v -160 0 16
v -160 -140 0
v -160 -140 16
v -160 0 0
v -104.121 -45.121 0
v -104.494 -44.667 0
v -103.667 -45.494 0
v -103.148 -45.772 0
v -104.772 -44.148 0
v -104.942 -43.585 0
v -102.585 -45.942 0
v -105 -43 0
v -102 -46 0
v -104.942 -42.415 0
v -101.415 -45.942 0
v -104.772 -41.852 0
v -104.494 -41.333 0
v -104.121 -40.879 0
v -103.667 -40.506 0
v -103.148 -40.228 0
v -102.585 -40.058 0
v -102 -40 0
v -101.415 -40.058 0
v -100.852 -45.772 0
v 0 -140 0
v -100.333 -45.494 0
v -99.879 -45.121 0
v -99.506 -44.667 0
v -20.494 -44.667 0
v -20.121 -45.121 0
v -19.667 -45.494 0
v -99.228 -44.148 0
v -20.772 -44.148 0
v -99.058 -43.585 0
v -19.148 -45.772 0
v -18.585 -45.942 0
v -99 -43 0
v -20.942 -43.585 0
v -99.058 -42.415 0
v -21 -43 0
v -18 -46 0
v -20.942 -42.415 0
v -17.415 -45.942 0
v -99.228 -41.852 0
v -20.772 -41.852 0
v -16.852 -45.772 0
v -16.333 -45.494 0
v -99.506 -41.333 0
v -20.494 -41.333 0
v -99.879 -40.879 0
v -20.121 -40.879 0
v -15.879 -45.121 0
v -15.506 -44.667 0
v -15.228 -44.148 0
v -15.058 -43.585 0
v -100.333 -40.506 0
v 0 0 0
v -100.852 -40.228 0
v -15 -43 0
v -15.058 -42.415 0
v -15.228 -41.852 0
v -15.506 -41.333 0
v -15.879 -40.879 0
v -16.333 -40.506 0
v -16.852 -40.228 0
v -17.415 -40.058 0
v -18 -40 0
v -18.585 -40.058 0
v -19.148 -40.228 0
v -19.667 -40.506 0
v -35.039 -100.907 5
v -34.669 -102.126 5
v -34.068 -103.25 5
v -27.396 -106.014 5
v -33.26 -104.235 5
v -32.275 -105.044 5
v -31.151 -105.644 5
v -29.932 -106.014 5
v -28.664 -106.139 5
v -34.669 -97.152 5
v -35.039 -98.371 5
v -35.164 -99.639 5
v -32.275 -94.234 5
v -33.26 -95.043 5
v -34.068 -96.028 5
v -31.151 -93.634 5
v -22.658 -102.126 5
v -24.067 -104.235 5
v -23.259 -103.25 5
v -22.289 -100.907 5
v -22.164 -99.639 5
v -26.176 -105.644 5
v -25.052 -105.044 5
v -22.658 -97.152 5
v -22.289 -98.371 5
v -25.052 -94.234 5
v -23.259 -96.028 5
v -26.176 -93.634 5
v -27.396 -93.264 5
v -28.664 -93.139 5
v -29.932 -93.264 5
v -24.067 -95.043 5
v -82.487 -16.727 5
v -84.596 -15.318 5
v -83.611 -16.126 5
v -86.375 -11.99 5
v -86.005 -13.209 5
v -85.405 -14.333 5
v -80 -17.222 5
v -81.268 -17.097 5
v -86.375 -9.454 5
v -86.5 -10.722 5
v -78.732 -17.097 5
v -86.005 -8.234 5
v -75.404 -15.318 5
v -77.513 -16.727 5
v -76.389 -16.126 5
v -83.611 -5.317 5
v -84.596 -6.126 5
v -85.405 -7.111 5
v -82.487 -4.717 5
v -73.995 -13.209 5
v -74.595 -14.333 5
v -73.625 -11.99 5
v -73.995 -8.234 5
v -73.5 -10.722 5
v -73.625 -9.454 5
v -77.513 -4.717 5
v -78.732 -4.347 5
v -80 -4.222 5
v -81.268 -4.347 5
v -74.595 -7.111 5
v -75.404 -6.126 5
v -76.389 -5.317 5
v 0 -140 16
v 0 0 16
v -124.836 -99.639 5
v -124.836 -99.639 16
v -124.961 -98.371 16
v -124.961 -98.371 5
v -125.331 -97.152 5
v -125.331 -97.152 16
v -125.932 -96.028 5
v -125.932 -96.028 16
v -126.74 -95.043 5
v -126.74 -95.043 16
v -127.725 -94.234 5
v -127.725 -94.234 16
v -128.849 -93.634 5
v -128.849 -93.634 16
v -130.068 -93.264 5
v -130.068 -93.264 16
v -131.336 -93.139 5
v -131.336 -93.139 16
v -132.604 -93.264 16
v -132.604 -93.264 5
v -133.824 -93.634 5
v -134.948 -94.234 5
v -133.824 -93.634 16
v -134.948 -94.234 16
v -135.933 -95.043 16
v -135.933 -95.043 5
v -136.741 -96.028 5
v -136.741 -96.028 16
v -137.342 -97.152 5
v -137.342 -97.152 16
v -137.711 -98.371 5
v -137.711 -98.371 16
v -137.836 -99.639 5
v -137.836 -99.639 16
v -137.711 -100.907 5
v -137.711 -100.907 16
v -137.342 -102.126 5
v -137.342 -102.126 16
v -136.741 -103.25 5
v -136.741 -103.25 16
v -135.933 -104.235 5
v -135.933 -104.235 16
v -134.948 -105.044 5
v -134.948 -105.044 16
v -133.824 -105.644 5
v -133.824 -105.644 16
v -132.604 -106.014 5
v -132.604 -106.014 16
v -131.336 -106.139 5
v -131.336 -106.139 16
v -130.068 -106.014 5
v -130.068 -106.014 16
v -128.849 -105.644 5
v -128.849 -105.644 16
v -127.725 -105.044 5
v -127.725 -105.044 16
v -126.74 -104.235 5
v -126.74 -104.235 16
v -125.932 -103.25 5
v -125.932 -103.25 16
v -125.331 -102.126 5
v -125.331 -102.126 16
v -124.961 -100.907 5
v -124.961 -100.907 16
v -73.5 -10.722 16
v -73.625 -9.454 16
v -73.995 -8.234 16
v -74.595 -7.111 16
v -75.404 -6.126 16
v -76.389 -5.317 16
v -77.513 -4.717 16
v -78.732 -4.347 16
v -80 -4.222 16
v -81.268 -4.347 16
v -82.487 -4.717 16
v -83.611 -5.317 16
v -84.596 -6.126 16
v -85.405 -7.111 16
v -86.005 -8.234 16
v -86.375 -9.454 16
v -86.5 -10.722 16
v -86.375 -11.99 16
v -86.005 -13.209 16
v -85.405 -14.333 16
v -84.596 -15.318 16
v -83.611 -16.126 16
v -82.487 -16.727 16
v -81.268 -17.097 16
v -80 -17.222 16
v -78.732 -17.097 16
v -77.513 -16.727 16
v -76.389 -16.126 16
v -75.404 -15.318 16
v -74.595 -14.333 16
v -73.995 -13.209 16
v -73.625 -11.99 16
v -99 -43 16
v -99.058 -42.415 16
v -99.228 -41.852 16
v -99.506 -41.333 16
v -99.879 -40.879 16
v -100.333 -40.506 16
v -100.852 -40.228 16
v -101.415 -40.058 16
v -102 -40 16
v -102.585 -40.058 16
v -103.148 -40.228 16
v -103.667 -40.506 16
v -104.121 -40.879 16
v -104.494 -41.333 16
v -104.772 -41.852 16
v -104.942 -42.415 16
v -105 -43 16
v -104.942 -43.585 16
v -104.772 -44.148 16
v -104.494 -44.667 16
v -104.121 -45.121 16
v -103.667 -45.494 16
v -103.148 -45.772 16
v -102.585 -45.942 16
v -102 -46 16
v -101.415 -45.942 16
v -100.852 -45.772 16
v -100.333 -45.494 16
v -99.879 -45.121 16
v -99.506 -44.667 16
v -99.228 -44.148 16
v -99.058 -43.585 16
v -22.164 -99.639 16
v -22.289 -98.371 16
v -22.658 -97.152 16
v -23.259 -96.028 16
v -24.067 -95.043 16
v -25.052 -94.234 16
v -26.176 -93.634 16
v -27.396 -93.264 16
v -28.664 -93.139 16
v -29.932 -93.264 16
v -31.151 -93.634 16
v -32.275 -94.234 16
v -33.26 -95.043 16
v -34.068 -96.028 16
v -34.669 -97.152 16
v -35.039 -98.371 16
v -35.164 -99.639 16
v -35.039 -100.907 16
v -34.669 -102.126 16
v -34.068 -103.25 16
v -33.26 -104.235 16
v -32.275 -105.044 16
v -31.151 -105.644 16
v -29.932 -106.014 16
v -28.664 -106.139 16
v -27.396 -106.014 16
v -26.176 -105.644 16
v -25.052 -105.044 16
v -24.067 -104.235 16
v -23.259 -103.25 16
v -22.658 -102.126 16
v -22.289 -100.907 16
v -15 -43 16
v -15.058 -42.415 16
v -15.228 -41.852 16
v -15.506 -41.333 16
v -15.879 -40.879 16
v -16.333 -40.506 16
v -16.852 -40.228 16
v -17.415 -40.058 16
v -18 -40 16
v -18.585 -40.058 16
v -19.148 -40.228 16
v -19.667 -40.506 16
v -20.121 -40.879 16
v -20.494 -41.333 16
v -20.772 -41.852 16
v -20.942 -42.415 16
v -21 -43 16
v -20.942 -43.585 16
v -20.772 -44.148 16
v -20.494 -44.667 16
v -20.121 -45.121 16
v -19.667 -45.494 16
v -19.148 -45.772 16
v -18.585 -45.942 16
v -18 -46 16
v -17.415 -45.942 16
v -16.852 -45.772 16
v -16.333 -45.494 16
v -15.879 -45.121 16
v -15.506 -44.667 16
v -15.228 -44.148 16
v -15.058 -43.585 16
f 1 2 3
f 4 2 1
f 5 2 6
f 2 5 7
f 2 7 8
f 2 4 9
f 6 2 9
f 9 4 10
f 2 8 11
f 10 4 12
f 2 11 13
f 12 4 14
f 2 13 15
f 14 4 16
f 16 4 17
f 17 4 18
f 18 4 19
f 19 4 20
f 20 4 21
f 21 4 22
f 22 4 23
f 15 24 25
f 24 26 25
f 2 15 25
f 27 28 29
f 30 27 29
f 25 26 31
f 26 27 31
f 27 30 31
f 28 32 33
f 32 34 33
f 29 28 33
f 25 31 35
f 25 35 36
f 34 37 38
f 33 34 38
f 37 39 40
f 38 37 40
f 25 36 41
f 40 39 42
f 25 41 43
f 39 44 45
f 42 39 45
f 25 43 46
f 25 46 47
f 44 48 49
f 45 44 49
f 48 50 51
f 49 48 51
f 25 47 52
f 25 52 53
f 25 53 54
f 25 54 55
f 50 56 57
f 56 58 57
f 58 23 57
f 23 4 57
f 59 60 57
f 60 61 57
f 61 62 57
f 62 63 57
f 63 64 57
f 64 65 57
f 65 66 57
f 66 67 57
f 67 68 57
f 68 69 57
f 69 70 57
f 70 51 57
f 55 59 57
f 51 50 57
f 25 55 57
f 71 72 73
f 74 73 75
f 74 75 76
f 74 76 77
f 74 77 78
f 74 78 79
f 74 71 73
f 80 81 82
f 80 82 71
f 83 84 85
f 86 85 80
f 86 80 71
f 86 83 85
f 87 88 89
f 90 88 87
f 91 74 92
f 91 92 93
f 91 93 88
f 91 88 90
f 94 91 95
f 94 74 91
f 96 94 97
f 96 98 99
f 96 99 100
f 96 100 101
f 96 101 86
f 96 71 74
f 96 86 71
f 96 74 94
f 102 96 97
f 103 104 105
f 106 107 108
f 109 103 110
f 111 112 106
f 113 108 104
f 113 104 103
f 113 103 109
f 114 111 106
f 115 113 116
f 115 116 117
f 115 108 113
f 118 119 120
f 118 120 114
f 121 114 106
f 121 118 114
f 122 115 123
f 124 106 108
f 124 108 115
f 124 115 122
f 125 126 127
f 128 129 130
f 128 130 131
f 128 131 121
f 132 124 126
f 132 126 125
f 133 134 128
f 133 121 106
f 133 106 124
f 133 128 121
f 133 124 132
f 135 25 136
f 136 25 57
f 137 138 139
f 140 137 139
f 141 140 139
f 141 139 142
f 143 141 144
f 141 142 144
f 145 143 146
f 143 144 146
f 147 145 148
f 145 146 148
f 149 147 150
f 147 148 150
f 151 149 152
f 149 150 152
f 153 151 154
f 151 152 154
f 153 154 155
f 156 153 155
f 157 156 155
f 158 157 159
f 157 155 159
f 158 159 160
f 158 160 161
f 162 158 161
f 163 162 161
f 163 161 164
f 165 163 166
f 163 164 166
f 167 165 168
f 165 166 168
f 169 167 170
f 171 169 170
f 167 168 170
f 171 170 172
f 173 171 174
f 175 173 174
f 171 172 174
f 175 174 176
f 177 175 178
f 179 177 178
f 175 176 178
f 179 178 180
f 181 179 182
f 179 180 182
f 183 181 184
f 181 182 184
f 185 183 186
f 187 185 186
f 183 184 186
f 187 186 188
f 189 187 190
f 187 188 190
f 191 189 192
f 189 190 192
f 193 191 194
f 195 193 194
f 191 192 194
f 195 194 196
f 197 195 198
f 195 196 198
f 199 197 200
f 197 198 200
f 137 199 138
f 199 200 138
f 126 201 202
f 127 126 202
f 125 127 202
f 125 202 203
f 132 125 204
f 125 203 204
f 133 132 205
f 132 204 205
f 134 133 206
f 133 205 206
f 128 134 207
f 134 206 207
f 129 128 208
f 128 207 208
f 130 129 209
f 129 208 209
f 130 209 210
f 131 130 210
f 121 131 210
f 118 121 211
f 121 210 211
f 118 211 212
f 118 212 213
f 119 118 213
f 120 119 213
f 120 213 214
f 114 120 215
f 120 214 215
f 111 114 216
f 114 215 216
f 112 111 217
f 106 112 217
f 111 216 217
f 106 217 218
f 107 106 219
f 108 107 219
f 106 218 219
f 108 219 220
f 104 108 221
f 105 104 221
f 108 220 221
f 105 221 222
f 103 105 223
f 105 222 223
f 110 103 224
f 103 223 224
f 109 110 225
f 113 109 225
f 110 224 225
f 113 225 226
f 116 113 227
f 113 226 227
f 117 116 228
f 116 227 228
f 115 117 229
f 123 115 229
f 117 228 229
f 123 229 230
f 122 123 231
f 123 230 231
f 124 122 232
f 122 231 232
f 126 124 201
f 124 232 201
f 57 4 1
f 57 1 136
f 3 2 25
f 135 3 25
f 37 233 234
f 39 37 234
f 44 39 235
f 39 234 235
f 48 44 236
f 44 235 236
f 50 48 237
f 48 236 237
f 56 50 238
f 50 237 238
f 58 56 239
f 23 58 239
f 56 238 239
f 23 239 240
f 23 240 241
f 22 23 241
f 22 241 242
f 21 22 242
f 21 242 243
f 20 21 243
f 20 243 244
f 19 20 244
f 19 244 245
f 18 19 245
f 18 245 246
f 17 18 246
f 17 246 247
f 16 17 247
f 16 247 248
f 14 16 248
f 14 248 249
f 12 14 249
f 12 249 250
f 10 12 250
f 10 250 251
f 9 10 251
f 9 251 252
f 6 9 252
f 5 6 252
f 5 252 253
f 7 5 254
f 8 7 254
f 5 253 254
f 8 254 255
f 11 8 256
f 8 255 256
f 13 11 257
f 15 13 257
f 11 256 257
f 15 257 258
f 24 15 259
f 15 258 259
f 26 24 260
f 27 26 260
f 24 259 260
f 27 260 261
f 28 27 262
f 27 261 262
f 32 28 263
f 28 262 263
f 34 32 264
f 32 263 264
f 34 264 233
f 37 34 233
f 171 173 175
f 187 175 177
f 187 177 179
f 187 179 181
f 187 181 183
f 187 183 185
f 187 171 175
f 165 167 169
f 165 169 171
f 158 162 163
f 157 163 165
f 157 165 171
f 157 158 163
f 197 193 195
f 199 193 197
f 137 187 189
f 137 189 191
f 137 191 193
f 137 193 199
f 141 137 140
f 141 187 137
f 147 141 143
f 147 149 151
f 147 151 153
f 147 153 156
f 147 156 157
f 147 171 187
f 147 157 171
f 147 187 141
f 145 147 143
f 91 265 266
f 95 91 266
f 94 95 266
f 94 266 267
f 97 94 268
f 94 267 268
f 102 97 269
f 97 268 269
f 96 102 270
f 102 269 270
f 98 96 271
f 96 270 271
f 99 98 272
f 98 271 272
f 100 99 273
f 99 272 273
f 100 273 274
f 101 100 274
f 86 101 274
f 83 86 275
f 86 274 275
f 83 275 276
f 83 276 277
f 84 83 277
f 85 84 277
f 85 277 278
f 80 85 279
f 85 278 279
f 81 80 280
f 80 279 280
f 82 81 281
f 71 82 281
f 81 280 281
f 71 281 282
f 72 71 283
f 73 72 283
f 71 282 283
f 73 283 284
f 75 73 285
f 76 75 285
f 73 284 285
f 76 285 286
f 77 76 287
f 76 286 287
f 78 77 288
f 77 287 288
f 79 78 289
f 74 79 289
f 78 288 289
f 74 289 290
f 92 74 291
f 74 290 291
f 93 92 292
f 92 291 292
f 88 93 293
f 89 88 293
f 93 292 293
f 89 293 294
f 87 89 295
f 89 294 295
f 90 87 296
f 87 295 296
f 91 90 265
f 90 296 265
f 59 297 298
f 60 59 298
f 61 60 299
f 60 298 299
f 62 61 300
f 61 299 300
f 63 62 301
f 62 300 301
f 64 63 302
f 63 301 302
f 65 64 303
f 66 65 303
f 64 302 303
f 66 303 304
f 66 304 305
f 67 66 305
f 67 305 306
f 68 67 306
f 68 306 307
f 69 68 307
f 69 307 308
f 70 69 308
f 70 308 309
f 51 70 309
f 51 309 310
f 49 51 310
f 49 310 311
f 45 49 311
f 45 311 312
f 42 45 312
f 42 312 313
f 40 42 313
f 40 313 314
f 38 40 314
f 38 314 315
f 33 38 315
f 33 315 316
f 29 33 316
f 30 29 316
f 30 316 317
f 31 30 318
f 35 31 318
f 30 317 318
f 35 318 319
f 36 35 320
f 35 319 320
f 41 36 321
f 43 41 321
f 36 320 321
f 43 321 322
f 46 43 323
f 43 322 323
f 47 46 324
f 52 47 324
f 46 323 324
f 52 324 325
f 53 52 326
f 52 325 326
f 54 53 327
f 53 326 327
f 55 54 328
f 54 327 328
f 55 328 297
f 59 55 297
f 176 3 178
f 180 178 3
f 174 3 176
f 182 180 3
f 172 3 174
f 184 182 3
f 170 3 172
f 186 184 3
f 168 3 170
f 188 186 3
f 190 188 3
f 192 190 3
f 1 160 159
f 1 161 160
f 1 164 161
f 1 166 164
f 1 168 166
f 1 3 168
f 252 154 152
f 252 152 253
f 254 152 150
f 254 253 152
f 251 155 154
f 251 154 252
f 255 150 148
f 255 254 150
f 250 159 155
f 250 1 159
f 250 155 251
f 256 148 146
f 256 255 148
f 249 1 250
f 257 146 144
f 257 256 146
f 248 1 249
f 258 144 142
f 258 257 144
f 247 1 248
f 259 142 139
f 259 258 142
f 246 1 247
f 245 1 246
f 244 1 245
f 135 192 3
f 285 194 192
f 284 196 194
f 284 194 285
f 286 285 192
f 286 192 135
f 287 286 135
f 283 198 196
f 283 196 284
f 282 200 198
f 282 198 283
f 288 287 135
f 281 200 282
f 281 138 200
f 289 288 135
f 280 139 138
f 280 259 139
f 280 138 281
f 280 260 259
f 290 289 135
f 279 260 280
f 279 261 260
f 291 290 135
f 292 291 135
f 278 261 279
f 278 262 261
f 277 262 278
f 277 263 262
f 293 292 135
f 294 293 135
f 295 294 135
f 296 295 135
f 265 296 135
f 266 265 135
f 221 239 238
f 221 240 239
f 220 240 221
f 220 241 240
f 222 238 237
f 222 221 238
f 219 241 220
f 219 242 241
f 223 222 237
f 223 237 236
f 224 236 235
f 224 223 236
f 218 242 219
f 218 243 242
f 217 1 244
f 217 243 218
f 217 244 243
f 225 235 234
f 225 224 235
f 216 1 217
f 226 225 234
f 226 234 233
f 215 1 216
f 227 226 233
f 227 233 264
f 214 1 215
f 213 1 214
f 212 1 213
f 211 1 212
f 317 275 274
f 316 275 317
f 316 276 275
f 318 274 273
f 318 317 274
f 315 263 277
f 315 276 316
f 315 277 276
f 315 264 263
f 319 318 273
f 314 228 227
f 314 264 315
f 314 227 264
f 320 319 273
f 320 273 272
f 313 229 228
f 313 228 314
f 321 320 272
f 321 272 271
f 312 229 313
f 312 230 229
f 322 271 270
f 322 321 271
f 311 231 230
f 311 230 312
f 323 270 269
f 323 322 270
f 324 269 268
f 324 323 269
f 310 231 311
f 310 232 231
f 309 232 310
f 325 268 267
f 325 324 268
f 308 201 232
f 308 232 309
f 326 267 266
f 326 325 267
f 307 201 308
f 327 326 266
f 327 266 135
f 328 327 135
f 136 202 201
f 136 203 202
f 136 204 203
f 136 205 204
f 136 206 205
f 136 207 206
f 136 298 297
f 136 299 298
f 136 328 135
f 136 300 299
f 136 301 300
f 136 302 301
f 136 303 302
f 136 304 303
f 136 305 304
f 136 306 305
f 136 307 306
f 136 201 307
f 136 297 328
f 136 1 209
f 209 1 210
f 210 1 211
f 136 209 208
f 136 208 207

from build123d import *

# Parameters (mm, degrees)
SKETCH1_W           = 160
SKETCH1_H           = 140
BOSS_EXTRUDE1_DEPTH = 16
SKETCH2_R           = 6.5
CUT_EXTRUDE1_DEPTH  = 11
SKETCH3_R           = 3
CUT_EXTRUDE2_DEPTH  = 214.20412754


with BuildPart() as part:
    # Sketch1 → Boss-Extrude1 (new body)
    with BuildSketch(Plane.XY):
        with Locations((-80, -70)):
            Rectangle(SKETCH1_W, SKETCH1_H)
    extrude(amount=BOSS_EXTRUDE1_DEPTH)

    # Sketch2 → Cut-Extrude1 (cut)
    with BuildSketch(Plane.XY.offset(16)):
        with Locations((-131.336336798, -99.63904787)):
            Circle(SKETCH2_R)
        with Locations((-80, -10.721904261)):
            Circle(SKETCH2_R)
        with Locations((-28.663663202, -99.63904787)):
            Circle(SKETCH2_R)
    extrude(amount=-CUT_EXTRUDE1_DEPTH, mode=Mode.SUBTRACT)

    # Sketch3 → Cut-Extrude2 (cut, through all)
    with BuildSketch(Plane.XY.offset(16)):
        with Locations((-18, -43)):
            Circle(SKETCH3_R)
        with Locations((-102, -43)):
            Circle(SKETCH3_R)
    extrude(amount=-CUT_EXTRUDE2_DEPTH, mode=Mode.SUBTRACT)


solid = part.part
